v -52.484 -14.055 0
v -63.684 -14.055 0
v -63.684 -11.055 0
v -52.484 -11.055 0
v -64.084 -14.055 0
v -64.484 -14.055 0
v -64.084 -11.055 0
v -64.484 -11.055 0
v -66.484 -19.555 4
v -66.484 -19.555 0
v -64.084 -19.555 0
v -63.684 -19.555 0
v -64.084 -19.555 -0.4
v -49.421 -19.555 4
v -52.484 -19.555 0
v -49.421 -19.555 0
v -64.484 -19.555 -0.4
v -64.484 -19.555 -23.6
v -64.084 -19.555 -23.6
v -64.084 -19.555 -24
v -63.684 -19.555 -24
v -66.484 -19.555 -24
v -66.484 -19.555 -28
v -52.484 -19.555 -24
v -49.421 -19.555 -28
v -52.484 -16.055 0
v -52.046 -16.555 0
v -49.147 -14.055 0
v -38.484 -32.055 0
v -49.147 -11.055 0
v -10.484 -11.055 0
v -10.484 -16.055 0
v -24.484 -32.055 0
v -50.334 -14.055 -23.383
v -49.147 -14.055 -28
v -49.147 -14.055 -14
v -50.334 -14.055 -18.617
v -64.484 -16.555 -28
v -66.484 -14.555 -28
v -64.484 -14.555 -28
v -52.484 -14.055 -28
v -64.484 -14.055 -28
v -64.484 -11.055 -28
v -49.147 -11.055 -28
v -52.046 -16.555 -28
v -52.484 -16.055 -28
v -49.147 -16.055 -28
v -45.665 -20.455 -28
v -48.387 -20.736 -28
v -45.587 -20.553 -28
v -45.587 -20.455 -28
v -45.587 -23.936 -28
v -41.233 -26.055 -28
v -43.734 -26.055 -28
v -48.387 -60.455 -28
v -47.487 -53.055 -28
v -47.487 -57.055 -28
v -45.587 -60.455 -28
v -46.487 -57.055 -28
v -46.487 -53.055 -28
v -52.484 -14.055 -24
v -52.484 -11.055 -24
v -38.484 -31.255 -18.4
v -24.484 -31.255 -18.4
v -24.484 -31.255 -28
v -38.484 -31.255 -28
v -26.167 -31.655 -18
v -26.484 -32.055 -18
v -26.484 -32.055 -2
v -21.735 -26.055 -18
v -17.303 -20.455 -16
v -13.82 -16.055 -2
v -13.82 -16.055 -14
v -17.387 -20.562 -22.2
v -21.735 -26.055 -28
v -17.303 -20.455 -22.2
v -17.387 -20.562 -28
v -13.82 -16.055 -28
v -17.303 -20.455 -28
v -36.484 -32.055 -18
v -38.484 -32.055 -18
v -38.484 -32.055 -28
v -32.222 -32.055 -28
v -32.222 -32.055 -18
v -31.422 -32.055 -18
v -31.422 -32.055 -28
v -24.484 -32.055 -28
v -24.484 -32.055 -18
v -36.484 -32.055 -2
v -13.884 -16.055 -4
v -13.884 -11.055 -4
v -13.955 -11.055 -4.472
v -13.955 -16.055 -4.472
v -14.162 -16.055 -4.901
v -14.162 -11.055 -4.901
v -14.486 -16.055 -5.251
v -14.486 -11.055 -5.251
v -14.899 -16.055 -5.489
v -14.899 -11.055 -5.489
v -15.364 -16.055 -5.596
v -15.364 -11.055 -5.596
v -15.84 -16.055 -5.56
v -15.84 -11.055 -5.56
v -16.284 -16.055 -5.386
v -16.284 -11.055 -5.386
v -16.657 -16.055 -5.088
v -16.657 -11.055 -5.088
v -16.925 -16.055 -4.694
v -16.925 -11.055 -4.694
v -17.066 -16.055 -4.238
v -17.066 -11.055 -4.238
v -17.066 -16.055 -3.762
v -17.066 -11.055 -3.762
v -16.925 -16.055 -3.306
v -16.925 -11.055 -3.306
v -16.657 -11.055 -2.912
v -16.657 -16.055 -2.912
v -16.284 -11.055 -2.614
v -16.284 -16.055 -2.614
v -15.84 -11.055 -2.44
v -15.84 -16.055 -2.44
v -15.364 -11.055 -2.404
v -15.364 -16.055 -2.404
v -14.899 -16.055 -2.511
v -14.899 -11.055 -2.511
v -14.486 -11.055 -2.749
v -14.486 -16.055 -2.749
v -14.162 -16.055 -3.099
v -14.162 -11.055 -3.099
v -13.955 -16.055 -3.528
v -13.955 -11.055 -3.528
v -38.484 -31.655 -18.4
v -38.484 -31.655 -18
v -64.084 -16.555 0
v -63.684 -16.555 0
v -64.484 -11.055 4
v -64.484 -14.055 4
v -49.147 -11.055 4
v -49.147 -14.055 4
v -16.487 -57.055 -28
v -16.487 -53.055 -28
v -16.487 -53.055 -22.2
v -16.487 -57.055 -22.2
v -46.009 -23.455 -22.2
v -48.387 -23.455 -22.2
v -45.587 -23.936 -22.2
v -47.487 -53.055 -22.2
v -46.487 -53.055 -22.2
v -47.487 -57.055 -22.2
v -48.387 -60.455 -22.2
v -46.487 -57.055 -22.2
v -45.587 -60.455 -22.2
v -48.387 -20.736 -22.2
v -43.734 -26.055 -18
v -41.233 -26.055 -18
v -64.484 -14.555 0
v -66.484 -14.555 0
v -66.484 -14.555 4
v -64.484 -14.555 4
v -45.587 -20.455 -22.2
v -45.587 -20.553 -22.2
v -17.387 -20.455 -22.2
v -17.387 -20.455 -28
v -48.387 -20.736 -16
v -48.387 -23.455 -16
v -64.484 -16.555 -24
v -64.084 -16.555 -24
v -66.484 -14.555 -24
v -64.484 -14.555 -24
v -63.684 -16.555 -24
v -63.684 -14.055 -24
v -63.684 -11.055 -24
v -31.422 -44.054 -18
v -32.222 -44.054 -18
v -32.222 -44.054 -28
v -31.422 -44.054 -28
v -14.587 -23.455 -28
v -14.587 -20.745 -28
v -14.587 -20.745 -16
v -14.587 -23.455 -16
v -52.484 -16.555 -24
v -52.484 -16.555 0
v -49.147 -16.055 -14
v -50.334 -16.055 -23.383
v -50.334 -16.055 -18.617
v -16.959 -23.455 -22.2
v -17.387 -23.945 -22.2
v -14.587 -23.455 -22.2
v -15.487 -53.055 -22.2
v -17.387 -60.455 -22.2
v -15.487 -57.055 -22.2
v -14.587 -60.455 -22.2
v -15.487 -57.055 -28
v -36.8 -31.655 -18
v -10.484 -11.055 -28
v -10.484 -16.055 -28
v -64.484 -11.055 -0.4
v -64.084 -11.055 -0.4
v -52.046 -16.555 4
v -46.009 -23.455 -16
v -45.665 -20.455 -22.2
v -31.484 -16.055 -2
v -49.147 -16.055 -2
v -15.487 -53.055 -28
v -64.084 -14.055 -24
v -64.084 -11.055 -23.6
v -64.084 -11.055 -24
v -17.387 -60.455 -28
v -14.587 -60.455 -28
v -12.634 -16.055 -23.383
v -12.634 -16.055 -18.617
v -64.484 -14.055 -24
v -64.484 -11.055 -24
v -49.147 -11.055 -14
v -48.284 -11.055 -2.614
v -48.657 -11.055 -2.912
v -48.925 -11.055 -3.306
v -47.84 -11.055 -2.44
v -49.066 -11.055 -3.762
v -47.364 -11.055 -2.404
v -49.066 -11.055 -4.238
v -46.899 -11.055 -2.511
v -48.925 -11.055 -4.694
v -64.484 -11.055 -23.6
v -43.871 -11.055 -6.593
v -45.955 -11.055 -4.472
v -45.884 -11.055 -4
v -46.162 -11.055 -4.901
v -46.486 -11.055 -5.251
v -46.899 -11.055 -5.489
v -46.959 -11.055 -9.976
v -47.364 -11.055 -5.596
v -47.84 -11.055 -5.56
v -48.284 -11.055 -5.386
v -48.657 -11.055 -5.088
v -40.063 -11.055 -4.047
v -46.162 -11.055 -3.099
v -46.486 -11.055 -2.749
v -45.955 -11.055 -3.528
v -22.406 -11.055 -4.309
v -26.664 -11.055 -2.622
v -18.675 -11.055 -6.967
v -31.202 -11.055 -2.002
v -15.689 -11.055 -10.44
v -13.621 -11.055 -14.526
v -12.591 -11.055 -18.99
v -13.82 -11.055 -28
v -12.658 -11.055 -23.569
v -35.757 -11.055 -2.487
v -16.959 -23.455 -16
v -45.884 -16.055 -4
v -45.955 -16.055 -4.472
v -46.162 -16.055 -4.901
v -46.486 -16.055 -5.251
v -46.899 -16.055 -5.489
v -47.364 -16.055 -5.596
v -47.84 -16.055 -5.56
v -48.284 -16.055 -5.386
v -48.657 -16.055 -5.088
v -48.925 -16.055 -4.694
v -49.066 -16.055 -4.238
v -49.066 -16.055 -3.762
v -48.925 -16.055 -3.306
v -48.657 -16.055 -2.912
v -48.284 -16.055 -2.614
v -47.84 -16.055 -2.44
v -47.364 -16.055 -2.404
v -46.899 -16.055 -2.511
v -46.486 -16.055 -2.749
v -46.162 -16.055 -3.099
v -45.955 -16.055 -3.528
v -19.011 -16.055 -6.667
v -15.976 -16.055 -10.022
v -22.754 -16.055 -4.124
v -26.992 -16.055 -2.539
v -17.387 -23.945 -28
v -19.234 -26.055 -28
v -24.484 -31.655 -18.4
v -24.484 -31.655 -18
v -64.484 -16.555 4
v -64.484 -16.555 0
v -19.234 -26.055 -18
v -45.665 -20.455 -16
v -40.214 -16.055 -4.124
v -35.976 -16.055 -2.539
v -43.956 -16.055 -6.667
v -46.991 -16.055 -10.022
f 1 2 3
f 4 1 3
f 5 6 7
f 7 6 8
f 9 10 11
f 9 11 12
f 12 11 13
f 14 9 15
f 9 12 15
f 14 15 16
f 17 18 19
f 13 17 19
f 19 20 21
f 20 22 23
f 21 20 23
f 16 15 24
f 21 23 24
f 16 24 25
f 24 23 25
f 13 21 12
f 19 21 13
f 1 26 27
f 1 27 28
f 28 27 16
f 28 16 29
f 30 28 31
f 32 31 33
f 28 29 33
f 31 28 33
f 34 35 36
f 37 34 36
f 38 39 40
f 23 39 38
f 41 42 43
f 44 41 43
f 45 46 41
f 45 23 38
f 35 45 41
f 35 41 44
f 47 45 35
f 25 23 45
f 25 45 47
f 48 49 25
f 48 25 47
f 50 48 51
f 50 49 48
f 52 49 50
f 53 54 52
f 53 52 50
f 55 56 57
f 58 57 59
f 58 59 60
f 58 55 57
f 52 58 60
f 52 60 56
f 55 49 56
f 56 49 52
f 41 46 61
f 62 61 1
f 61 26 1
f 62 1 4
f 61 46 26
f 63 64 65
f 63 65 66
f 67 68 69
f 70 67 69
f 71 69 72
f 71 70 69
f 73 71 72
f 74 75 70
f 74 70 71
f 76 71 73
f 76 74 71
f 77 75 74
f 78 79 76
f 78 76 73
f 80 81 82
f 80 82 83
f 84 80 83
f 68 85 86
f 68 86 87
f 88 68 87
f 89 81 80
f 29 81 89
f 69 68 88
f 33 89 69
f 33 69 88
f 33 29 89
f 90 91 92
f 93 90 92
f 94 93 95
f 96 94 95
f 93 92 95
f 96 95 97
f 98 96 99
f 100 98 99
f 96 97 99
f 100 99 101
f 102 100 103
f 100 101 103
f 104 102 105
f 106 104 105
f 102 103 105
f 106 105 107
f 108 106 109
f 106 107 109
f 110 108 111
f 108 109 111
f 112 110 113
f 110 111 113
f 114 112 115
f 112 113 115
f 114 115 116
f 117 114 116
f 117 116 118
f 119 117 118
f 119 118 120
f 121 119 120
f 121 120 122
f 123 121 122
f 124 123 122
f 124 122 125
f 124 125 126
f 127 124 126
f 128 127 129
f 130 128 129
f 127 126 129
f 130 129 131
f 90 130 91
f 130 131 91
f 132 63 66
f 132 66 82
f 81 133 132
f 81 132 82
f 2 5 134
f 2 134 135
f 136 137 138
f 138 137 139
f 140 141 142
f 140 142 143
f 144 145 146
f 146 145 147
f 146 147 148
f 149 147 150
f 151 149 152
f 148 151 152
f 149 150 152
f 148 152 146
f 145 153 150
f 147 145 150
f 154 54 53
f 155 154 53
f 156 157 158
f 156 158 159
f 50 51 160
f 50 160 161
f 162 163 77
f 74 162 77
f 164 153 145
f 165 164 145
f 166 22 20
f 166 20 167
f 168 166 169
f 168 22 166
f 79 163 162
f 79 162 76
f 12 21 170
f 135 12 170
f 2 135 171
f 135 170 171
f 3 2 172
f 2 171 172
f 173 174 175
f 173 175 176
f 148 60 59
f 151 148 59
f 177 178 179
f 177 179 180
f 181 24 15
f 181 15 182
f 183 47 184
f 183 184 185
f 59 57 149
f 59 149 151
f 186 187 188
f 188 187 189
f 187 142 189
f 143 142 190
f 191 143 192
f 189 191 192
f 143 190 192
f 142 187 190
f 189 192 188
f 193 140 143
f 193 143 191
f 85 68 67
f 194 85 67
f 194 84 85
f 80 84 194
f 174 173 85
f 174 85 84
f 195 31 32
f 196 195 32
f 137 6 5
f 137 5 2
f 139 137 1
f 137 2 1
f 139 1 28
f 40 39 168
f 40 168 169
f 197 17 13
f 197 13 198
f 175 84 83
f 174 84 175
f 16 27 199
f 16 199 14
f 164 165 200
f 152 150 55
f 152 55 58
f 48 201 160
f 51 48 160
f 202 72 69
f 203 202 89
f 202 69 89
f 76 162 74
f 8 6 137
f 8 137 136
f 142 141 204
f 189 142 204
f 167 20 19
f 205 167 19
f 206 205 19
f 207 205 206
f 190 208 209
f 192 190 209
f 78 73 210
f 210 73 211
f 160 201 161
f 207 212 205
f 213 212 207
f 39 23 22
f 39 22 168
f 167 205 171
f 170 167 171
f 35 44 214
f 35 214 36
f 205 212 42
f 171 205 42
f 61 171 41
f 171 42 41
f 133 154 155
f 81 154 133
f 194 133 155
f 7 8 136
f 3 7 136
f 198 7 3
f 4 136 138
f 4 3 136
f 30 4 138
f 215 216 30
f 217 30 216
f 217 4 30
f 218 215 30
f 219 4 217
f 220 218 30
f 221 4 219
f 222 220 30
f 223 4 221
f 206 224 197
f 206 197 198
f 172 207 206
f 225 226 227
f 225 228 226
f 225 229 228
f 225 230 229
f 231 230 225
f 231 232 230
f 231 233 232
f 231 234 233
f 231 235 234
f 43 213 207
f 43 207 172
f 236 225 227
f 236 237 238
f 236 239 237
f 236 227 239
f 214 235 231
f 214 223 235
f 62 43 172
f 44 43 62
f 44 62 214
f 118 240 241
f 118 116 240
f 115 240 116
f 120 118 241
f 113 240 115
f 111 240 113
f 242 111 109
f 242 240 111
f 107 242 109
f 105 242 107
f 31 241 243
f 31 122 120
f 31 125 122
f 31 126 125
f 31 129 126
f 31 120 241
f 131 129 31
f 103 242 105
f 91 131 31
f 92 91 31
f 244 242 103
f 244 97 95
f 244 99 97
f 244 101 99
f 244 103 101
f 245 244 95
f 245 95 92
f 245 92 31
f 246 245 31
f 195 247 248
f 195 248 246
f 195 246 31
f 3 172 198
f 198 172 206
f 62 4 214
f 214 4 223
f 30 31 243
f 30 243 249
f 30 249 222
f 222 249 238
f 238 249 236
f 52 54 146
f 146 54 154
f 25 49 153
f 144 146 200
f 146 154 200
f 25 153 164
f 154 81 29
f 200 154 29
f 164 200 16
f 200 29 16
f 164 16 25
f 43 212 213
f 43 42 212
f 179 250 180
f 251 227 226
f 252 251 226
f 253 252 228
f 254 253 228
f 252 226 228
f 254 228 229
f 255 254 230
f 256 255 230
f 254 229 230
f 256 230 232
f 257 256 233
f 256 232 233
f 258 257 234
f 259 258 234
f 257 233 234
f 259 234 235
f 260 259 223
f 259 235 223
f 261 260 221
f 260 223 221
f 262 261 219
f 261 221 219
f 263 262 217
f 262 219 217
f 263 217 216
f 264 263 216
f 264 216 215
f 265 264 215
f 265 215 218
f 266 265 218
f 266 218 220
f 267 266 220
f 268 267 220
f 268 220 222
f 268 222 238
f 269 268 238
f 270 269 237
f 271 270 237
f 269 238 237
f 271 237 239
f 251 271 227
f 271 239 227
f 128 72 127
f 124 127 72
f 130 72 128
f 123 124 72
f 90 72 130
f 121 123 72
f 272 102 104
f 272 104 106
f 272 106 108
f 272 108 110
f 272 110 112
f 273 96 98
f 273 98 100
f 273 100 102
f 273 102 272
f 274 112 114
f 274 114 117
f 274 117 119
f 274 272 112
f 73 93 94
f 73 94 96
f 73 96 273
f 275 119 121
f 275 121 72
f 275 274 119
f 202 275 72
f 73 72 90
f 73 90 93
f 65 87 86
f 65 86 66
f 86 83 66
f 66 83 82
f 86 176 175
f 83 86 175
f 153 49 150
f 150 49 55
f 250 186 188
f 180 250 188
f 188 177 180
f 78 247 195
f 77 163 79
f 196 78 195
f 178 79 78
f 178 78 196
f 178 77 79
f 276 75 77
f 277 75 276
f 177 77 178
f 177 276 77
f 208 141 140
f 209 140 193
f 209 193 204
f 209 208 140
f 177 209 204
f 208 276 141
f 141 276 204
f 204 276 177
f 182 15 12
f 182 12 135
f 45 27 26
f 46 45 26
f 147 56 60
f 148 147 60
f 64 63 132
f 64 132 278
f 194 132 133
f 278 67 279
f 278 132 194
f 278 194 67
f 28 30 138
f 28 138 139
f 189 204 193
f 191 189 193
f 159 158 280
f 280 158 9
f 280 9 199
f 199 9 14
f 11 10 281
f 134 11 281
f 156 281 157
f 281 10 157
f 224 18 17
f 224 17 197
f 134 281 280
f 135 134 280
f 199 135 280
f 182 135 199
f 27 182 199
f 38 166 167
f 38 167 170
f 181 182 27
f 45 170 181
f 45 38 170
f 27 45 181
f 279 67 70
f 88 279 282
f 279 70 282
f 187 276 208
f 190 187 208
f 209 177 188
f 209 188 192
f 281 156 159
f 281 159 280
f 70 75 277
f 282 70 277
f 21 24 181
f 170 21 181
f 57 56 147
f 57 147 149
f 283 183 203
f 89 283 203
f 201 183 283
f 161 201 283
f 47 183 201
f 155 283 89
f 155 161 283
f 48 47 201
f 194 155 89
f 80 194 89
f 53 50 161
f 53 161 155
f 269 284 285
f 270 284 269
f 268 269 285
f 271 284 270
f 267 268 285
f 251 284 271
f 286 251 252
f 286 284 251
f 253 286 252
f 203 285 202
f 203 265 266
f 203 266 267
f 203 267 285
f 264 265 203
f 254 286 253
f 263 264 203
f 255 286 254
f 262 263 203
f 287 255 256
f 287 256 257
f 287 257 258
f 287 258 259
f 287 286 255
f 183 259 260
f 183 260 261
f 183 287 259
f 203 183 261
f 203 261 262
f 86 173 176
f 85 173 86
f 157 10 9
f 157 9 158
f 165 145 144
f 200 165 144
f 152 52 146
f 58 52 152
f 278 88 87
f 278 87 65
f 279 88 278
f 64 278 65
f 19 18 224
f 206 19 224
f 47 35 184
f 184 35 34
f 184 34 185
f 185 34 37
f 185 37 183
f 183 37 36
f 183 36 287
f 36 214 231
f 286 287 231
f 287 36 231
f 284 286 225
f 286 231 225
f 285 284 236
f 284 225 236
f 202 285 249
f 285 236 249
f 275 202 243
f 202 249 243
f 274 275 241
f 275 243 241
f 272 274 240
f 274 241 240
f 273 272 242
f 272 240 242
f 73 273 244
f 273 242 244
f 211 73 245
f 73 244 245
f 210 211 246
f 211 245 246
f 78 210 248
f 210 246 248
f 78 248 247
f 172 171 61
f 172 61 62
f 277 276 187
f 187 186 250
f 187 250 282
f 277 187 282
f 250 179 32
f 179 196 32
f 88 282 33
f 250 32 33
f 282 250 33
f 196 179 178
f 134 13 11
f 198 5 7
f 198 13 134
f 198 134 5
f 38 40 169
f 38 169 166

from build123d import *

# Parameters (mm, degrees)
PAD_DEPTH       = 28
SKETCH001_R     = 19
POCKET_DEPTH    = 5
POCKET001_DEPTH = 26
SKETCH003_W     = 30
SKETCH003_H     = 6
POCKET002_DEPTH = 10
SKETCH004_W     = 2.8
SKETCH004_H     = 40
PAD001_DEPTH    = 5.8
SKETCH005_W     = 2.722469
SKETCH005_H     = 3
SKETCH005_W_2   = 2.715425
PAD002_DEPTH    = 12
SKETCH006_R     = 1.6
POCKET003_DEPTH = 5
SKETCH007_W     = 1
SKETCH007_H     = 4
POCKET004_DEPTH = 6
PAD003_DEPTH    = 10
SKETCH009_W     = 14.845783
SKETCH009_H     = 0.4
POCKET005_DEPTH = 0.4
SKETCH010_W     = 15.336478
SKETCH010_H     = 3
PAD004_DEPTH    = 32
SKETCH011_W     = 8.5
SKETCH011_H     = 24
POCKET006_DEPTH = 14
SKETCH012_W     = 0.8
SKETCH012_H     = 8.5
PAD005_DEPTH    = 24
SKETCH013_W     = 8.5
SKETCH013_H     = 0.4
POCKET007_DEPTH = 0.4


with BuildPart() as part:
    # Sketch → Pad (new body)
    with BuildSketch(Plane(origin=(0, 0, 0), x_dir=(1, 0, 0), z_dir=(0, 0, -1))):
        Polygon((-52.483848, 11.054775), (-10.483848, 11.054775), (-10.483848, 16.054775), (-24.483848, 32.054775), (-38.483848, 32.054775), (-52.483848, 16.054775), align=None)
    extrude(amount=PAD_DEPTH)

    # Sketch001 → Pocket (cut)
    with BuildSketch(Plane(origin=(0, -11.054775, 0), x_dir=(1, 0, 0), z_dir=(0, 1, 0))):
        with Locations((-31.483848, 21)):
            Circle(SKETCH001_R)
    extrude(amount=-POCKET_DEPTH, mode=Mode.SUBTRACT)

    # Sketch002 → Pocket001 (cut)
    with BuildSketch(Plane(origin=(0, 0, -28), x_dir=(1, 0, 0), z_dir=(0, 0, -1))):
        Polygon((-49.14737, 16.054775), (-36.483848, 32.054775), (-26.483848, 32.054775), (-13.820326, 16.054775), align=None)
    extrude(amount=-POCKET001_DEPTH, mode=Mode.SUBTRACT)

    # Sketch003 → Pocket002 (cut)
    with BuildSketch(Plane(origin=(0, 0, -28), x_dir=(1, 0, 0), z_dir=(0, 0, -1))):
        with Locations((-31.483848, 29.054775)):
            Rectangle(SKETCH003_W, SKETCH003_H)
    extrude(amount=-POCKET002_DEPTH, mode=Mode.SUBTRACT)

    # Sketch004 → Pad001 (new body)
    with BuildSketch(Plane(origin=(0, 0, -28), x_dir=(1, 0, 0), z_dir=(0, 0, -1))):
        with Locations((-46.98737, 40.454775)):
            Rectangle(SKETCH004_W, SKETCH004_H)
        with Locations((-15.98737, 40.454775)):
            Rectangle(SKETCH004_W, SKETCH004_H)
    extrude(amount=-PAD001_DEPTH)

    # Sketch005 → Pad002 (new body)
    with BuildSketch(Plane(origin=(0, 0, -28), x_dir=(1, 0, 0), z_dir=(0, 0, -1))):
        with Locations((-47.026135, 21.954775)):
            Rectangle(SKETCH005_W, SKETCH005_H)
        with Locations((-15.945082, 21.954775)):
            Rectangle(SKETCH005_W_2, SKETCH005_H)
    extrude(amount=-PAD002_DEPTH)

    # Sketch006 → Pocket003 (cut)
    with BuildSketch(Plane(origin=(0, -11.054775, 0), x_dir=(1, 0, 0), z_dir=(0, 1, 0))):
        with Locations((-47.483848, 4)):
            Circle(SKETCH006_R)
        with Locations((-15.483848, 4)):
            Circle(SKETCH006_R)
    extrude(amount=-POCKET003_DEPTH, mode=Mode.SUBTRACT)

    # Sketch007 → Pocket004 (cut)
    with BuildSketch(Plane(origin=(0, 0, -28), x_dir=(1, 0, 0), z_dir=(0, 0, -1))):
        with Locations((-46.98737, 55.054775)):
            Rectangle(SKETCH007_W, SKETCH007_H)
        with Locations((-15.98737, 55.054775)):
            Rectangle(SKETCH007_W, SKETCH007_H)
    extrude(amount=-POCKET004_DEPTH, mode=Mode.SUBTRACT)

    # Sketch008 → Pad003 (new body)
    with BuildSketch(Plane(origin=(0, 0, -18), x_dir=(1, 0, 0), z_dir=(0, 0, -1))):
        Polygon((-32.222141, 44.054382), (-31.422141, 44.054382), (-31.422141, 32.054775), (-24.483848, 32.054775), (-24.483848, 31.254775), (-38.483848, 31.254775), (-38.483848, 32.054775), (-32.222141, 32.054775), align=None)
    extrude(amount=PAD003_DEPTH)

    # Sketch009 → Pocket005 (cut)
    with BuildSketch(Plane(origin=(0, -31.254775, 0), x_dir=(1, 0, 0), z_dir=(0, 1, 0))):
        with Locations((-31.447088, 18.2)):
            Rectangle(SKETCH009_W, SKETCH009_H)
    extrude(amount=-POCKET005_DEPTH, mode=Mode.SUBTRACT)

    # Sketch010 → Pad004 (new body)
    with BuildSketch(Plane(origin=(0, 0, -28), x_dir=(1, 0, 0), z_dir=(0, 0, -1))):
        Polygon((-49.421348, 19.554775), (-66.483848, 19.554775), (-66.483848, 14.554775), (-64.483848, 14.554775), (-64.483848, 16.554775), (-52.046348, 16.554775), align=None)
        with Locations((-56.815609, 12.554775)):
            Rectangle(SKETCH010_W, SKETCH010_H)
    extrude(amount=-PAD004_DEPTH)

    # Sketch011 → Pocket006 (cut)
    with BuildSketch(Plane(origin=(-66.483848, 0, 0), x_dir=(0, 1, 0), z_dir=(-1, 0, 0))):
        with Locations((-15.304775, 12)):
            Rectangle(SKETCH011_W, SKETCH011_H)
    extrude(amount=-POCKET006_DEPTH, mode=Mode.SUBTRACT)

    # Sketch012 → Pad005 (new body)
    with BuildSketch(Plane.XY.offset(-24)):
        with Locations((-64.083848, -15.304775)):
            Rectangle(SKETCH012_W, SKETCH012_H)
    extrude(amount=PAD005_DEPTH)

    # Sketch013 → Pocket007 (cut)
    with BuildSketch(Plane(origin=(-64.483848, 0, 0), x_dir=(0, 1, 0), z_dir=(-1, 0, 0))):
        with Locations((-15.304775, 0.2)):
            Rectangle(SKETCH013_W, SKETCH013_H)
        with Locations((-15.304775, 23.8)):
            Rectangle(SKETCH013_W, SKETCH013_H)
    extrude(amount=-POCKET007_DEPTH, mode=Mode.SUBTRACT)


solid = part.part
